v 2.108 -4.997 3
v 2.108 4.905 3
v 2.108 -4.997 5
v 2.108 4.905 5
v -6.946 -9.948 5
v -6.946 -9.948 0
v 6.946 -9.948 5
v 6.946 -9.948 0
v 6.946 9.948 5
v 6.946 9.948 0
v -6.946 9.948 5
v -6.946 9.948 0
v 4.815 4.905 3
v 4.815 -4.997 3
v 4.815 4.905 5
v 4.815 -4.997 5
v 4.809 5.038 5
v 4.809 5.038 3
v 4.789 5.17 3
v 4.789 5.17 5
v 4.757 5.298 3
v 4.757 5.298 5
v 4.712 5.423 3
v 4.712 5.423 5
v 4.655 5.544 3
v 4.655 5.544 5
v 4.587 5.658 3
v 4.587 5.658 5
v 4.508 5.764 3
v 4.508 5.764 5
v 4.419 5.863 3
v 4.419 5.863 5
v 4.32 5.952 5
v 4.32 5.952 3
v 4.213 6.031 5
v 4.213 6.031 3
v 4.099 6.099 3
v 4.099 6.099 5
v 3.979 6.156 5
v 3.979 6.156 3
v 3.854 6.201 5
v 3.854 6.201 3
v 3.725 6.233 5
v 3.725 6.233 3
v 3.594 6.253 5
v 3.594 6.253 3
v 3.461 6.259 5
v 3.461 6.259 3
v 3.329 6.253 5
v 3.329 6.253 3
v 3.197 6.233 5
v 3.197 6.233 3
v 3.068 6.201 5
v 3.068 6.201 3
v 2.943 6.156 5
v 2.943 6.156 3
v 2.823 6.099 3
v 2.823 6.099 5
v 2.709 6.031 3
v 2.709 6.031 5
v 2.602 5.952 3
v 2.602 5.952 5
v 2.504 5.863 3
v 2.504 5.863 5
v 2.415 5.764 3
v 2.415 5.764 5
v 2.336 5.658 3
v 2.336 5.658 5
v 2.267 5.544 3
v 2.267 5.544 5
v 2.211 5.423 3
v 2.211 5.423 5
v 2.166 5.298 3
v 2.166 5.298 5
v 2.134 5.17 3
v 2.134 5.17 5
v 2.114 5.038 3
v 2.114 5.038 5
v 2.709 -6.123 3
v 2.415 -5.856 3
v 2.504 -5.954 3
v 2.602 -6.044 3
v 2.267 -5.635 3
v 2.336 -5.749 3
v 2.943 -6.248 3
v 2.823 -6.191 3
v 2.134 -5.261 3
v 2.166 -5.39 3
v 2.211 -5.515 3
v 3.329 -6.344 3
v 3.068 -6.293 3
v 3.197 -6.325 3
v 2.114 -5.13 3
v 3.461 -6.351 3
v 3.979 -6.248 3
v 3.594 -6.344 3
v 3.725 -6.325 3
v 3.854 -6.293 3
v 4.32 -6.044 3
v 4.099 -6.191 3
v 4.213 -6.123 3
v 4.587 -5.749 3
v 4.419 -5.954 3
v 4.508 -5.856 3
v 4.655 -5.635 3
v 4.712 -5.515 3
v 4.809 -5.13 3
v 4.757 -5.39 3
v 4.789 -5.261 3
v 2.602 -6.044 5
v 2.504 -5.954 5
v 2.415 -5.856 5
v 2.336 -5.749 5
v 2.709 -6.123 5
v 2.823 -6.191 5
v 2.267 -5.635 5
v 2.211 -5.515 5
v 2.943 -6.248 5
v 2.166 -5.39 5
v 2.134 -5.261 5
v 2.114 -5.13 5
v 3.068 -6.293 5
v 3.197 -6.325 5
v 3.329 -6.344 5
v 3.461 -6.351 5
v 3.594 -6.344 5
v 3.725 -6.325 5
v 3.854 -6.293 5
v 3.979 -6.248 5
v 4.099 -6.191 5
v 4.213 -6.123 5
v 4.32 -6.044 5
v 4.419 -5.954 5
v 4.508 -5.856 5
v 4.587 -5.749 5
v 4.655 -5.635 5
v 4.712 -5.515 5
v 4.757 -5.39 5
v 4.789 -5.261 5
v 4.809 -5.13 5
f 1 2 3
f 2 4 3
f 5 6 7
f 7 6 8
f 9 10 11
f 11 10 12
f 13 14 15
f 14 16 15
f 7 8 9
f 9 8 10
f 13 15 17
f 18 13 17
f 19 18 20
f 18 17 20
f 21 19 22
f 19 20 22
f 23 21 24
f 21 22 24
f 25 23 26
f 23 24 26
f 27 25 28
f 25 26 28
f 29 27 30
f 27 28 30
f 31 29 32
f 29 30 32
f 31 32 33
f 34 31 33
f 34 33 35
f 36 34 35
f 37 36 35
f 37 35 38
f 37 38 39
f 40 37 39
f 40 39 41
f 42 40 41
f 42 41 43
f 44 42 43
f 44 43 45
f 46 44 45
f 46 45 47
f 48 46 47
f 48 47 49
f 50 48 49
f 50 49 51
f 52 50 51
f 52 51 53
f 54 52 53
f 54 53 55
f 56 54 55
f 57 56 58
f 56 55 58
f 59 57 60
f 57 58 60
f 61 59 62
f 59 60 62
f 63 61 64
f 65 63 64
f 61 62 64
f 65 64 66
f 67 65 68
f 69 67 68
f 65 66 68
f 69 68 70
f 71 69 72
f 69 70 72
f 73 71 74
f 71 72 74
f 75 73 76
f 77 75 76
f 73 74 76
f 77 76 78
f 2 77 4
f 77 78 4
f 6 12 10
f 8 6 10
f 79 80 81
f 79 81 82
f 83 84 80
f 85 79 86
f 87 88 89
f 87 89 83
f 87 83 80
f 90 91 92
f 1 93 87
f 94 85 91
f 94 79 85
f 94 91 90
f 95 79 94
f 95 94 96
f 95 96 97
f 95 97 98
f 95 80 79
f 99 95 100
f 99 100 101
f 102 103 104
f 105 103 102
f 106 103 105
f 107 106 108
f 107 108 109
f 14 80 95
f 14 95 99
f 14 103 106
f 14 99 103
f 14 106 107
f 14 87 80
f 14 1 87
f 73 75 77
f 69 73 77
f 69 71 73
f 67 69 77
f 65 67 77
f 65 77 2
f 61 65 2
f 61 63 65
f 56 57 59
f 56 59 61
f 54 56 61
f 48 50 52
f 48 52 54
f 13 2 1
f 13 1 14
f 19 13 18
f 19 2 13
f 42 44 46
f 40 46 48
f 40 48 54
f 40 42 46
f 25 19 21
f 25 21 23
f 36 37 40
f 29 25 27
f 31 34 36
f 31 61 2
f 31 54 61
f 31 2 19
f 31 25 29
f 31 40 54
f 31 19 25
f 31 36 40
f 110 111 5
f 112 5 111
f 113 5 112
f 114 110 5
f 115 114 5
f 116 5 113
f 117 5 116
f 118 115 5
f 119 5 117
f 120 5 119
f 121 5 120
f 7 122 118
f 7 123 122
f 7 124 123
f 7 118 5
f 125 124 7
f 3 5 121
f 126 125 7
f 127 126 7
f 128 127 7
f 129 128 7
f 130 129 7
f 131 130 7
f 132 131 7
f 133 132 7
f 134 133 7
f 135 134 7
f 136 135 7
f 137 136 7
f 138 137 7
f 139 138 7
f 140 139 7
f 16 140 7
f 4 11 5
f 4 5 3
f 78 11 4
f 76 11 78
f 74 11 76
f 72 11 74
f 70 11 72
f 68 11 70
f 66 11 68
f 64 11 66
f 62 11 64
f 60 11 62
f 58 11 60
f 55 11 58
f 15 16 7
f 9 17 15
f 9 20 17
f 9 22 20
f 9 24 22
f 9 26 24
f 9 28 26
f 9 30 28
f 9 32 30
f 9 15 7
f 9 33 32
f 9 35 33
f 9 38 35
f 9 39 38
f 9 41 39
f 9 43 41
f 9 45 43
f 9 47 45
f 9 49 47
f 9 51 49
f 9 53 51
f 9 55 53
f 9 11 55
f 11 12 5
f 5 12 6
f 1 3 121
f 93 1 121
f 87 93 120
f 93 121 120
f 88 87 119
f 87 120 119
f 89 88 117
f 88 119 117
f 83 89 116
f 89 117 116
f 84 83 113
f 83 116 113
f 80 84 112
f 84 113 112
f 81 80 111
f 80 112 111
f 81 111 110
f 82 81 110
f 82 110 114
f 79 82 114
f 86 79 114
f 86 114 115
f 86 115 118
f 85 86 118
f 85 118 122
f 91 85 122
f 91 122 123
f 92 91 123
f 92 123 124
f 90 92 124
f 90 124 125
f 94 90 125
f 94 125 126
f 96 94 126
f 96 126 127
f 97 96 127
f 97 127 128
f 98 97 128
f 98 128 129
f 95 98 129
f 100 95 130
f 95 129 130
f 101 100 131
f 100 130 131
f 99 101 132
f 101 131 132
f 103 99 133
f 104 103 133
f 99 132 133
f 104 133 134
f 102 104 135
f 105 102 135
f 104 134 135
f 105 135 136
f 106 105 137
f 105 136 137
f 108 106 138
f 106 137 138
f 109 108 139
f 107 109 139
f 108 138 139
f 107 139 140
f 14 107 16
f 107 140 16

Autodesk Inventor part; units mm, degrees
ref_plane "YZ Plane" through (0, 0, 0) normal (1, 0, 0) x (0, 1, 0)
ref_plane "XZ Plane" through (0, 0, 0) normal (0, 1, 0) x (-1, 0, 0)
ref_plane "XY Plane" through (0, 0, 0) normal (0, 0, 1) x (1, 0, 0)
sketch "スケッチ22" plane through (0, 0, 0) normal (0, 0, 1) x (1, 0, 0)
  line L0 (-6.9456, -9.9484) -> (6.9456, -9.9484)
  line L1 (6.9456, -9.9484) -> (6.9456, 9.9484)
  line L2 (6.9456, 9.9484) -> (-6.9456, 9.9484)
  line L3 (-6.9456, 9.9484) -> (-6.9456, -9.9484)
  line L4 (-6.9456, -9.9484) -> (6.9456, 9.9484) construction
  line L5 (6.9456, -9.9484) -> (-6.9456, 9.9484) construction
  point P0 (0, 0)
extrude "押し出し14" add sketch "スケッチ22" along normal blind 5
sketch "スケッチ23" plane through (0, 0, 5) normal (0, 0, 1) x (1, 0, 0)
  line L0 (3.4613, 4.9054) -> (3.4613, -4.9971) construction
  line L1 (2.1075, 4.9054) -> (2.1075, -4.9971)
  line L2 (4.8151, -4.9971) -> (4.8151, 4.9054)
  arc A0 (4.8151, 4.9054) -> (2.1075, 4.9054) centre (3.4613, 4.9054) ccw
  arc A1 (2.1075, -4.9971) -> (4.8151, -4.9971) centre (3.4613, -4.9971) ccw
  point P0 (0, 0)
  point P1 (3.4613, -0.0458)
extrude "押し出し15" cut sketch "スケッチ23" against normal blind 2
properties material "A5052"
